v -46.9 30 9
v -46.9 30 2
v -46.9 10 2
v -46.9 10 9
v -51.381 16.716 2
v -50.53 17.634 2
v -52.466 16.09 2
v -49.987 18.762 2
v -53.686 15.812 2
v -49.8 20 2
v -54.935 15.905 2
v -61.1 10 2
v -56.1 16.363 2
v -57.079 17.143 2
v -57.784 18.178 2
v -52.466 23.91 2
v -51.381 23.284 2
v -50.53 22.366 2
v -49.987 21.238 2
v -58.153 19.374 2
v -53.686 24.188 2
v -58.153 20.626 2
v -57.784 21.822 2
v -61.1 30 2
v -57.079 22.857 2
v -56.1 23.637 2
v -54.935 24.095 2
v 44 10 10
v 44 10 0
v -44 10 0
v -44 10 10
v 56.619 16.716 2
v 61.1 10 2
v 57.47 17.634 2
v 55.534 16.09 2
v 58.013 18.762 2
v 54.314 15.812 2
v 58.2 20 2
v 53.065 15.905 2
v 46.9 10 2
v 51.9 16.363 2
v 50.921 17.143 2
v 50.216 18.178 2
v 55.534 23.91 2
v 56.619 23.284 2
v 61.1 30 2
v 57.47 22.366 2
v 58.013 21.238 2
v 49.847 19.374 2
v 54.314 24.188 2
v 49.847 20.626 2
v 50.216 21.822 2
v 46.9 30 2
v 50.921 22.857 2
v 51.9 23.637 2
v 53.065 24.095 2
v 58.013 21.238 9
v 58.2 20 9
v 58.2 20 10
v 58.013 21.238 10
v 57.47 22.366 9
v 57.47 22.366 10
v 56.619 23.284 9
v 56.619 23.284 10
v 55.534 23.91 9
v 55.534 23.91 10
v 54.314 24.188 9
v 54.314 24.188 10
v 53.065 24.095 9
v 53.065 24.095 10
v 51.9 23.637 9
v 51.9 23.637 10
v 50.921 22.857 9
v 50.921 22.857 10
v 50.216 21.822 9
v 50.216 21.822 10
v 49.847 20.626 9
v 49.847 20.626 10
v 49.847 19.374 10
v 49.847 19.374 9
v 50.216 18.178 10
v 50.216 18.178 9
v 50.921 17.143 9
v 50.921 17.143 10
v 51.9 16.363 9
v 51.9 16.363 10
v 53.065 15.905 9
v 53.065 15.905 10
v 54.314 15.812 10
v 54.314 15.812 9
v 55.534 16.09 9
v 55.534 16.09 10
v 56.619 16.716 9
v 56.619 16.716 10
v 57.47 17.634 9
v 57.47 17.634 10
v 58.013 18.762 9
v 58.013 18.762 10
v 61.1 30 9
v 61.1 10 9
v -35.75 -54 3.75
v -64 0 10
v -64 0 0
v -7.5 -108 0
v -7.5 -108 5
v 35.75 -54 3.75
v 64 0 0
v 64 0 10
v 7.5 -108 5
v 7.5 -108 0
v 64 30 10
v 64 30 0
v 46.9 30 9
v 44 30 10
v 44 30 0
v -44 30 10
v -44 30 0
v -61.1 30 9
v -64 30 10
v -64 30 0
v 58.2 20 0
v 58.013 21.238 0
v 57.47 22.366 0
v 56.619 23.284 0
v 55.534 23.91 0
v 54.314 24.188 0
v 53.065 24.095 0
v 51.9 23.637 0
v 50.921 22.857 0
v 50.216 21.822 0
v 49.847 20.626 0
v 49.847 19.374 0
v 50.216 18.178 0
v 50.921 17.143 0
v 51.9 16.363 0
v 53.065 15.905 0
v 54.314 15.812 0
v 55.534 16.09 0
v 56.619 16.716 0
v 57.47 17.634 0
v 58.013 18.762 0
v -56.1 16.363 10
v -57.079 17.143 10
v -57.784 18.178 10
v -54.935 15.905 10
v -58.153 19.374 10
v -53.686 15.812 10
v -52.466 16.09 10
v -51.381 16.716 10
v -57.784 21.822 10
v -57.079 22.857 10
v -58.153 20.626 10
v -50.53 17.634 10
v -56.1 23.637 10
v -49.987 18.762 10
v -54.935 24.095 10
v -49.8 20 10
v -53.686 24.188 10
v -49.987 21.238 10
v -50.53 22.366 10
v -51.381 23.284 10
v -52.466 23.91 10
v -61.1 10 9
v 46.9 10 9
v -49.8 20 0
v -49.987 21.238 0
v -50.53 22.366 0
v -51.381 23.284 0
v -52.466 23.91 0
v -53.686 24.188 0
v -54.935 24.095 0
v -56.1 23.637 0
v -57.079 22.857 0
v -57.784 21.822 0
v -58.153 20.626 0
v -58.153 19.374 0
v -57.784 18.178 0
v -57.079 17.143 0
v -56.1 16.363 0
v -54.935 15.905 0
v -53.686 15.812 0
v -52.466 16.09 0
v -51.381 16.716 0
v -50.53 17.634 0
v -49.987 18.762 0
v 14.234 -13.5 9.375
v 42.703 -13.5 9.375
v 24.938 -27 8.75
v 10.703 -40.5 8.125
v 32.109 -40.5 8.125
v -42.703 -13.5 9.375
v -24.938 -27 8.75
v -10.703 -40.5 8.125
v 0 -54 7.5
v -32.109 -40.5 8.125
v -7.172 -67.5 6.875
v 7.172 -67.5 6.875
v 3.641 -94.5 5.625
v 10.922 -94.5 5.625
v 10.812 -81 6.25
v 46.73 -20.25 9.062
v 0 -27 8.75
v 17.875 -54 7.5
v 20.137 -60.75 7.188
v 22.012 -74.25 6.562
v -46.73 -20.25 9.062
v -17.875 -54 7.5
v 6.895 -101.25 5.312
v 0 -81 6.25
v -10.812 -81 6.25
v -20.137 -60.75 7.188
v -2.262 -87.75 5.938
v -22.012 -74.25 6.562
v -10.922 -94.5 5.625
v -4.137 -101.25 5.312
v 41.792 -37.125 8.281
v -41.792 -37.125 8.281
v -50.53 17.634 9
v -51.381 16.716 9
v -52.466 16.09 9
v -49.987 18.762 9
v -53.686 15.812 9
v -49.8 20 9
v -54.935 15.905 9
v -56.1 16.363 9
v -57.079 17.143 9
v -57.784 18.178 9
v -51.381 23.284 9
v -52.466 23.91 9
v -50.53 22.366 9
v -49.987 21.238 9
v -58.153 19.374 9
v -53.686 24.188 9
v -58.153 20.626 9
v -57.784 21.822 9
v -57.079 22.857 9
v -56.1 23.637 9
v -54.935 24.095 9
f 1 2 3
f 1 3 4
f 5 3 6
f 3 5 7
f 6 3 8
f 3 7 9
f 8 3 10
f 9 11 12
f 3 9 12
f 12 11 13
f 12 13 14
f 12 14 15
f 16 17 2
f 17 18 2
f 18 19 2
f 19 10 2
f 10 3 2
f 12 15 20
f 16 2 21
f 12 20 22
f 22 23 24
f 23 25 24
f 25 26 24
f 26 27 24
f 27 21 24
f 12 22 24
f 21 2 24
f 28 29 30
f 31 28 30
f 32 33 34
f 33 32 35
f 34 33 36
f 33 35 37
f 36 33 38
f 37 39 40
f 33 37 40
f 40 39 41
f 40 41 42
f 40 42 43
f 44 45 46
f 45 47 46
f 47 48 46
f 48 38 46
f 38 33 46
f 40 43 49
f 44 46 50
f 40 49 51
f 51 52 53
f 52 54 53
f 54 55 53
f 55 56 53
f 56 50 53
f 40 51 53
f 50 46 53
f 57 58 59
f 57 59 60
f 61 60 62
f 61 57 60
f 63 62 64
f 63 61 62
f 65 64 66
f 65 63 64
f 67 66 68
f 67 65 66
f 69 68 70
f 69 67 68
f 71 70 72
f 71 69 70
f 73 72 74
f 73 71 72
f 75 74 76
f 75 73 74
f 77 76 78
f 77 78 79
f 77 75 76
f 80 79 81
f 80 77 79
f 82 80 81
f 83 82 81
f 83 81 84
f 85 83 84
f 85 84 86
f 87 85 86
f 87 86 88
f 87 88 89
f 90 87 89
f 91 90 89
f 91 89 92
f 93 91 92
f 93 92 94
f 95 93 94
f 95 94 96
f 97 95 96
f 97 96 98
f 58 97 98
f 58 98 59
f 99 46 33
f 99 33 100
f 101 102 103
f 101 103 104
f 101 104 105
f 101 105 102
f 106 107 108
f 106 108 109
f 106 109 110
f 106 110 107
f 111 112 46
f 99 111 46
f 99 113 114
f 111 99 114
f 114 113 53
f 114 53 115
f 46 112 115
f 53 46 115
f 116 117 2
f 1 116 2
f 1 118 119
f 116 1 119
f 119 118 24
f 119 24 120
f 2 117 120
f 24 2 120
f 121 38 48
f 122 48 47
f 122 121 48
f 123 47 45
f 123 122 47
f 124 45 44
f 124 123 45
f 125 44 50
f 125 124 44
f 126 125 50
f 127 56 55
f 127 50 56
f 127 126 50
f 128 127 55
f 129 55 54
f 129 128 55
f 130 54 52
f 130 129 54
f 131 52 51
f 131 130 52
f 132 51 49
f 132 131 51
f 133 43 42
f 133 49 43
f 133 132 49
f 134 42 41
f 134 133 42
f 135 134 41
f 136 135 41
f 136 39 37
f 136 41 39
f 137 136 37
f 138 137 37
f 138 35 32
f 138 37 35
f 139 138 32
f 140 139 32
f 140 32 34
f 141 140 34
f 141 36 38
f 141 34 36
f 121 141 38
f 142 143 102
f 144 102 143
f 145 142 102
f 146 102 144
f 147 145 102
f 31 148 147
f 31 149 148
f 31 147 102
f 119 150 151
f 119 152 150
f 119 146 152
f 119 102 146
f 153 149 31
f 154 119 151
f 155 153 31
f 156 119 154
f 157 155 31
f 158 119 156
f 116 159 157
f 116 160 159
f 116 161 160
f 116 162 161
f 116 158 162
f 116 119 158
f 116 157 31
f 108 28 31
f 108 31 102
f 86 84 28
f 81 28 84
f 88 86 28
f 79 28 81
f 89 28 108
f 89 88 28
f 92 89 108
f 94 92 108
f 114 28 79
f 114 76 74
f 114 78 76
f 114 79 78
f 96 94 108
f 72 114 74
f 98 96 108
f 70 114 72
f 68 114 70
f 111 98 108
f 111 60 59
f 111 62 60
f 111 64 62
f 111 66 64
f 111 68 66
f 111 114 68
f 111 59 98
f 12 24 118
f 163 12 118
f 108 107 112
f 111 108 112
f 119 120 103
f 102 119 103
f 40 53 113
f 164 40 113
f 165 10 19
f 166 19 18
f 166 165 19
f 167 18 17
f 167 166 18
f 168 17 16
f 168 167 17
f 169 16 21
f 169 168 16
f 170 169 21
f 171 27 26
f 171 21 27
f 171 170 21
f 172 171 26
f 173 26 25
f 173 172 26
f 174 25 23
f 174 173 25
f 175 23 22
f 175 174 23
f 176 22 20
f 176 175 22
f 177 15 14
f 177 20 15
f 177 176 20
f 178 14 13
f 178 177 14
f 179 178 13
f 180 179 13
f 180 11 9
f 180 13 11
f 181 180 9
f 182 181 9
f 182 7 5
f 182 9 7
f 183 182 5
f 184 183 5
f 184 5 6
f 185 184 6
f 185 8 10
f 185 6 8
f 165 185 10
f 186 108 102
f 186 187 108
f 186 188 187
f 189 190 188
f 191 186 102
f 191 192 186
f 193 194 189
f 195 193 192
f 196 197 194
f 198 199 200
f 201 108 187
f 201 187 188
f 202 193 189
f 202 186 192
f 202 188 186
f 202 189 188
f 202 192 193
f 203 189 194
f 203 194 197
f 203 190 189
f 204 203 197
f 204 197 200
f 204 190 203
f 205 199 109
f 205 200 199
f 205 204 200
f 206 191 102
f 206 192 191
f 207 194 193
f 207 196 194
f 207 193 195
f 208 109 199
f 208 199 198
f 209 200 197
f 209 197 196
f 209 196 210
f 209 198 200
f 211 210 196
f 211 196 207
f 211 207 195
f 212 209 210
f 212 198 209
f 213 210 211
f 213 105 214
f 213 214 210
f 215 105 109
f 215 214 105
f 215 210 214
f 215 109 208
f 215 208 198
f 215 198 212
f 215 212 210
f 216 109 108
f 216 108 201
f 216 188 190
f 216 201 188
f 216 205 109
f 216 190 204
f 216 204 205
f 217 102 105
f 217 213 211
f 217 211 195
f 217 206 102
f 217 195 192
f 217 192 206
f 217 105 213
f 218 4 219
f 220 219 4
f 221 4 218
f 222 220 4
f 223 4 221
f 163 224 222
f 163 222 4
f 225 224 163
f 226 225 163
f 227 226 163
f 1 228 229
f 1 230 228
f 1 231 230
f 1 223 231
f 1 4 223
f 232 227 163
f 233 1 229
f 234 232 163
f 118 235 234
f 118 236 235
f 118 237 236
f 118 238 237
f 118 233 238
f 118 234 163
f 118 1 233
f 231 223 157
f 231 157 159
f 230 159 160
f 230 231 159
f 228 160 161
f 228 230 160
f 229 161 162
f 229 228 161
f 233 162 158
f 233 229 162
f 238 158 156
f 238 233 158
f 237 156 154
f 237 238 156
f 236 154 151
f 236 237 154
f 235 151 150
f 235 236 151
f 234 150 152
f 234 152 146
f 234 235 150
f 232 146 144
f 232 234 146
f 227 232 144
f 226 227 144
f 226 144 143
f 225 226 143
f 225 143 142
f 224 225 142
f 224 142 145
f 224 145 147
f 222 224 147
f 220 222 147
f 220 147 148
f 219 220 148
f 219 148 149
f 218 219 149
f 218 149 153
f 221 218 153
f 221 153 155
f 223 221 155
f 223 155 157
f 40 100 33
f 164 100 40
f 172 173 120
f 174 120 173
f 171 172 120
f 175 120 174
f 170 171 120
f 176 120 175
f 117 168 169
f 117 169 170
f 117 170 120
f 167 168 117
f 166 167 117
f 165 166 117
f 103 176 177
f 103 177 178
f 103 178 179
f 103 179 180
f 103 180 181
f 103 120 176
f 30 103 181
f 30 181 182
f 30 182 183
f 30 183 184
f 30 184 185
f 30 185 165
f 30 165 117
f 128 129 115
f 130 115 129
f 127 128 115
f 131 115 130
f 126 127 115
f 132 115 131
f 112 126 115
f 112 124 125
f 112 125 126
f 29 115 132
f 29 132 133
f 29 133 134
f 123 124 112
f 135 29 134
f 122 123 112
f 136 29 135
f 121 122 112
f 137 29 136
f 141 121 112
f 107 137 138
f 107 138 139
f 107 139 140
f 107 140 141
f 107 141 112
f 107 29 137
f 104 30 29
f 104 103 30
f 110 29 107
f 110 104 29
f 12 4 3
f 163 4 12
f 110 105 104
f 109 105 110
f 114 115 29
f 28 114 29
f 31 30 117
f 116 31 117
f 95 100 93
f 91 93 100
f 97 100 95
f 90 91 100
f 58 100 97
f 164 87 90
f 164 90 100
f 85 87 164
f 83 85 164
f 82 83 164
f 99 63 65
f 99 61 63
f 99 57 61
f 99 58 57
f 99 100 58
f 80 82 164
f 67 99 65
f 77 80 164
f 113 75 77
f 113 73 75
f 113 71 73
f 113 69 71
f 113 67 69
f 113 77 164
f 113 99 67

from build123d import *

# Parameters (mm, degrees)
SKETCH002_W  = 128
SKETCH002_H  = 10
SKETCH001_W  = 15
SKETCH001_H  = 5
SKETCH_R     = 4.2
PAD_DEPTH    = 10
SKETCH003_W  = 14.2
SKETCH003_H  = 7
POCKET_DEPTH = 20


with BuildPart() as loft_body:
    # Sketch002 → Loft section 0
    with BuildSketch(Plane.XZ):
        with Locations((0, 5)):
            Rectangle(SKETCH002_W, SKETCH002_H)
    # Sketch001 → Loft section 1
    with BuildSketch(Plane.XZ.offset(108)):
        with Locations((0, 2.5)):
            Rectangle(SKETCH001_W, SKETCH001_H)
    loft()


with BuildPart() as pocket:
    # Sketch → Pad (new body)
    with BuildSketch(Plane.XY):
        Polygon((-64, 30), (-64, 0), (64, 0), (64, 30), (44, 30), (44, 10), (-44, 10), (-44, 30), align=None)
        with Locations((-54, 20)):
            Circle(SKETCH_R, mode=Mode.SUBTRACT)
        with Locations((54, 20)):
            Circle(SKETCH_R, mode=Mode.SUBTRACT)
    extrude(amount=PAD_DEPTH)

    # Fusion: union Loft body
    add(loft_body.part)

    # Sketch003 → Pocket (cut)
    with BuildSketch(Plane(origin=(0, 30, 0), x_dir=(-1, 0, 0), z_dir=(0, 1, 0))):
        with Locations((54, 5.5)):
            Rectangle(SKETCH003_W, SKETCH003_H)
        with Locations((-54, 5.5)):
            Rectangle(SKETCH003_W, SKETCH003_H)
    extrude(amount=-POCKET_DEPTH, mode=Mode.SUBTRACT)


solid = pocket.part
